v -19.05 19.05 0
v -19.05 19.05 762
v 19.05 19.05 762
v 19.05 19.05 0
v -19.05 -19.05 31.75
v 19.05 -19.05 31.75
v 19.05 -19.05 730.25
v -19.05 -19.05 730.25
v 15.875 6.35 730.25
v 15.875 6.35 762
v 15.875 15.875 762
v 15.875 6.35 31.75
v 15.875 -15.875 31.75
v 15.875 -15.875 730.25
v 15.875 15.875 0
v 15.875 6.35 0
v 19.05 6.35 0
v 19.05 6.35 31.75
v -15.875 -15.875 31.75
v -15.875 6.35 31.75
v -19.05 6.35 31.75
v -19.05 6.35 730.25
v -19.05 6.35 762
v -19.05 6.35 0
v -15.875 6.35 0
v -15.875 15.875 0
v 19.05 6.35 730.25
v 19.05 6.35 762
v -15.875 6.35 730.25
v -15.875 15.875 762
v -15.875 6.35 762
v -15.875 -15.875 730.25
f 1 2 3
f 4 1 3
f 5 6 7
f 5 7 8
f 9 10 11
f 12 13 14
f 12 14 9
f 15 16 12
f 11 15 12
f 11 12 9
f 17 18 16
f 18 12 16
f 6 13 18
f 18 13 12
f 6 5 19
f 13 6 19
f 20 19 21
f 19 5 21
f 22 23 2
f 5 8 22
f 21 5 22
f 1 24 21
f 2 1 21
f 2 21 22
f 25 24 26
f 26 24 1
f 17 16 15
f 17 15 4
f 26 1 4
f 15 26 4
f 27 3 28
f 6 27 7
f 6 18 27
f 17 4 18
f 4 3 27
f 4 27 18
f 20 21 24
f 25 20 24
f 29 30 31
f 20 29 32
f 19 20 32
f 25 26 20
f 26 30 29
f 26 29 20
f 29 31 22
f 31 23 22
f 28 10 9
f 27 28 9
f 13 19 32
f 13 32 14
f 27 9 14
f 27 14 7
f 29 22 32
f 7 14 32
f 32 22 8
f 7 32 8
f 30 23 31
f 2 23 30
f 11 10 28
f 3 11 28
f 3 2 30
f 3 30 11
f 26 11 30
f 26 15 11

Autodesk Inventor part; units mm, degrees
ref_plane "Start Plane" through (0, 0, 0) normal (0, 0, 1) x (1, 0, 0)
ref_plane "End Plane" through (0, 0, 762) normal (0, 0, 1) x (1, 0, 0)
sketch "Sketch" plane through (0, 0, 0) normal (0, 0, 1) x (1, 0, 0)
  line L0 (-19.05, 19.05) -> (19.05, 19.05)
  line L1 (19.05, 19.05) -> (19.05, -19.05)
  line L2 (19.05, -19.05) -> (-19.05, -19.05)
  line L3 (-19.05, -19.05) -> (-19.05, 19.05)
  line L4 (15.875, 15.875) -> (-15.875, 15.875)
  line L5 (-15.875, 15.875) -> (-15.875, -15.875)
  line L6 (-15.875, -15.875) -> (15.875, -15.875)
  line L7 (15.875, -15.875) -> (15.875, 15.875)
  point P0 (0, 0)
  point P1 (0, 19.05)
  point P2 (-19.05, 0)
  dimension "width" = 38.1
  dimension "d1" = 3.175
extrude "Body" add sketch "Sketch" along normal up to surface (762 mm away) from surface at 0
sketch "Sketch4" plane through (0, 0, 0) normal (0, 0, 1) x (1, 0, 0)
  line L0 (0, 0) -> (10, 0)
ref_plane "Work Plane4" through (0, 0, 0) normal (0, -1, 0) x (1, 0, 0)
sketch "Sketch5" plane through (0, 0, 0) normal (0, -1, 0) x (1, 0, 0)
  line L0 (-2, 0) -> (12, 0)
  line L1 (-2, 762) -> (12, 762)
  dimension "d9" = 762
ref_plane "Work Plane5" through (-895.35, -25.4, 762) normal (-1, 0, 0) x (0, 0, 1)
ref_plane "Work Plane6" through (234.95, -25.4, 0) normal (1, 0, 0) x (0, 0, -1)
ref_plane "Work Plane7" through (-330.2, -6.35, 6.35) normal (1, 0, 0) x (0, 0, -1)
sketch "Sketch6" plane through (-330.2, -6.35, 6.35) normal (1, 0, 0) x (0, 0, -1)
  line L0 (-25.4, 12.7) -> (25.4, 12.7)
  line L1 (25.4, 12.7) -> (25.4, -12.7)
  line L2 (25.4, -12.7) -> (-25.4, -12.7)
  line L3 (-25.4, -12.7) -> (-25.4, 12.7)
  line L4 (22.225, 9.525) -> (-22.225, 9.525)
  line L5 (-22.225, 9.525) -> (-22.225, -9.525)
  line L6 (-22.225, -9.525) -> (22.225, -9.525)
  line L7 (22.225, -9.525) -> (22.225, 9.525)
extrude "Extrusion3" cut sketch "Sketch6" along normal up to surface (1130.3 mm away) from surface at -565.15 contours L0 L1 L2 L3 | L7 L6 L5 L4
ref_plane "Work Plane8" through (-895.35, -25.4, 762) normal (-1, 0, 0) x (0, 0, 1)
ref_plane "Work Plane9" through (234.95, -25.4, 0) normal (1, 0, 0) x (0, 0, -1)
ref_plane "Work Plane10" through (-330.2, -6.35, 755.65) normal (1, 0, 0) x (0, 0, -1)
sketch "Sketch7" plane through (-330.2, -6.35, 755.65) normal (1, 0, 0) x (0, 0, -1)
  line L0 (-25.4, 12.7) -> (25.4, 12.7)
  line L1 (25.4, 12.7) -> (25.4, -12.7)
  line L2 (25.4, -12.7) -> (-25.4, -12.7)
  line L3 (-25.4, -12.7) -> (-25.4, 12.7)
  line L4 (22.225, 9.525) -> (-22.225, 9.525)
  line L5 (-22.225, 9.525) -> (-22.225, -9.525)
  line L6 (-22.225, -9.525) -> (22.225, -9.525)
  line L7 (22.225, -9.525) -> (22.225, 9.525)
extrude "Extrusion4" cut sketch "Sketch7" along normal up to surface (1130.3 mm away) from surface at -565.15 contours L0 L1 L2 L3 | L7 L6 L5 L4
equation "\"G_OFFSET_START\" = 0"
equation "\"G_OFFSET_END\" = 0"
equation "\"d5\" = length + G_OFFSET_END"
equation "\"G_L\" = 762"
equation "\"length\" = 762"
properties part number "1.5x1.5x.125 Tube" material "Aluminum-6061"
